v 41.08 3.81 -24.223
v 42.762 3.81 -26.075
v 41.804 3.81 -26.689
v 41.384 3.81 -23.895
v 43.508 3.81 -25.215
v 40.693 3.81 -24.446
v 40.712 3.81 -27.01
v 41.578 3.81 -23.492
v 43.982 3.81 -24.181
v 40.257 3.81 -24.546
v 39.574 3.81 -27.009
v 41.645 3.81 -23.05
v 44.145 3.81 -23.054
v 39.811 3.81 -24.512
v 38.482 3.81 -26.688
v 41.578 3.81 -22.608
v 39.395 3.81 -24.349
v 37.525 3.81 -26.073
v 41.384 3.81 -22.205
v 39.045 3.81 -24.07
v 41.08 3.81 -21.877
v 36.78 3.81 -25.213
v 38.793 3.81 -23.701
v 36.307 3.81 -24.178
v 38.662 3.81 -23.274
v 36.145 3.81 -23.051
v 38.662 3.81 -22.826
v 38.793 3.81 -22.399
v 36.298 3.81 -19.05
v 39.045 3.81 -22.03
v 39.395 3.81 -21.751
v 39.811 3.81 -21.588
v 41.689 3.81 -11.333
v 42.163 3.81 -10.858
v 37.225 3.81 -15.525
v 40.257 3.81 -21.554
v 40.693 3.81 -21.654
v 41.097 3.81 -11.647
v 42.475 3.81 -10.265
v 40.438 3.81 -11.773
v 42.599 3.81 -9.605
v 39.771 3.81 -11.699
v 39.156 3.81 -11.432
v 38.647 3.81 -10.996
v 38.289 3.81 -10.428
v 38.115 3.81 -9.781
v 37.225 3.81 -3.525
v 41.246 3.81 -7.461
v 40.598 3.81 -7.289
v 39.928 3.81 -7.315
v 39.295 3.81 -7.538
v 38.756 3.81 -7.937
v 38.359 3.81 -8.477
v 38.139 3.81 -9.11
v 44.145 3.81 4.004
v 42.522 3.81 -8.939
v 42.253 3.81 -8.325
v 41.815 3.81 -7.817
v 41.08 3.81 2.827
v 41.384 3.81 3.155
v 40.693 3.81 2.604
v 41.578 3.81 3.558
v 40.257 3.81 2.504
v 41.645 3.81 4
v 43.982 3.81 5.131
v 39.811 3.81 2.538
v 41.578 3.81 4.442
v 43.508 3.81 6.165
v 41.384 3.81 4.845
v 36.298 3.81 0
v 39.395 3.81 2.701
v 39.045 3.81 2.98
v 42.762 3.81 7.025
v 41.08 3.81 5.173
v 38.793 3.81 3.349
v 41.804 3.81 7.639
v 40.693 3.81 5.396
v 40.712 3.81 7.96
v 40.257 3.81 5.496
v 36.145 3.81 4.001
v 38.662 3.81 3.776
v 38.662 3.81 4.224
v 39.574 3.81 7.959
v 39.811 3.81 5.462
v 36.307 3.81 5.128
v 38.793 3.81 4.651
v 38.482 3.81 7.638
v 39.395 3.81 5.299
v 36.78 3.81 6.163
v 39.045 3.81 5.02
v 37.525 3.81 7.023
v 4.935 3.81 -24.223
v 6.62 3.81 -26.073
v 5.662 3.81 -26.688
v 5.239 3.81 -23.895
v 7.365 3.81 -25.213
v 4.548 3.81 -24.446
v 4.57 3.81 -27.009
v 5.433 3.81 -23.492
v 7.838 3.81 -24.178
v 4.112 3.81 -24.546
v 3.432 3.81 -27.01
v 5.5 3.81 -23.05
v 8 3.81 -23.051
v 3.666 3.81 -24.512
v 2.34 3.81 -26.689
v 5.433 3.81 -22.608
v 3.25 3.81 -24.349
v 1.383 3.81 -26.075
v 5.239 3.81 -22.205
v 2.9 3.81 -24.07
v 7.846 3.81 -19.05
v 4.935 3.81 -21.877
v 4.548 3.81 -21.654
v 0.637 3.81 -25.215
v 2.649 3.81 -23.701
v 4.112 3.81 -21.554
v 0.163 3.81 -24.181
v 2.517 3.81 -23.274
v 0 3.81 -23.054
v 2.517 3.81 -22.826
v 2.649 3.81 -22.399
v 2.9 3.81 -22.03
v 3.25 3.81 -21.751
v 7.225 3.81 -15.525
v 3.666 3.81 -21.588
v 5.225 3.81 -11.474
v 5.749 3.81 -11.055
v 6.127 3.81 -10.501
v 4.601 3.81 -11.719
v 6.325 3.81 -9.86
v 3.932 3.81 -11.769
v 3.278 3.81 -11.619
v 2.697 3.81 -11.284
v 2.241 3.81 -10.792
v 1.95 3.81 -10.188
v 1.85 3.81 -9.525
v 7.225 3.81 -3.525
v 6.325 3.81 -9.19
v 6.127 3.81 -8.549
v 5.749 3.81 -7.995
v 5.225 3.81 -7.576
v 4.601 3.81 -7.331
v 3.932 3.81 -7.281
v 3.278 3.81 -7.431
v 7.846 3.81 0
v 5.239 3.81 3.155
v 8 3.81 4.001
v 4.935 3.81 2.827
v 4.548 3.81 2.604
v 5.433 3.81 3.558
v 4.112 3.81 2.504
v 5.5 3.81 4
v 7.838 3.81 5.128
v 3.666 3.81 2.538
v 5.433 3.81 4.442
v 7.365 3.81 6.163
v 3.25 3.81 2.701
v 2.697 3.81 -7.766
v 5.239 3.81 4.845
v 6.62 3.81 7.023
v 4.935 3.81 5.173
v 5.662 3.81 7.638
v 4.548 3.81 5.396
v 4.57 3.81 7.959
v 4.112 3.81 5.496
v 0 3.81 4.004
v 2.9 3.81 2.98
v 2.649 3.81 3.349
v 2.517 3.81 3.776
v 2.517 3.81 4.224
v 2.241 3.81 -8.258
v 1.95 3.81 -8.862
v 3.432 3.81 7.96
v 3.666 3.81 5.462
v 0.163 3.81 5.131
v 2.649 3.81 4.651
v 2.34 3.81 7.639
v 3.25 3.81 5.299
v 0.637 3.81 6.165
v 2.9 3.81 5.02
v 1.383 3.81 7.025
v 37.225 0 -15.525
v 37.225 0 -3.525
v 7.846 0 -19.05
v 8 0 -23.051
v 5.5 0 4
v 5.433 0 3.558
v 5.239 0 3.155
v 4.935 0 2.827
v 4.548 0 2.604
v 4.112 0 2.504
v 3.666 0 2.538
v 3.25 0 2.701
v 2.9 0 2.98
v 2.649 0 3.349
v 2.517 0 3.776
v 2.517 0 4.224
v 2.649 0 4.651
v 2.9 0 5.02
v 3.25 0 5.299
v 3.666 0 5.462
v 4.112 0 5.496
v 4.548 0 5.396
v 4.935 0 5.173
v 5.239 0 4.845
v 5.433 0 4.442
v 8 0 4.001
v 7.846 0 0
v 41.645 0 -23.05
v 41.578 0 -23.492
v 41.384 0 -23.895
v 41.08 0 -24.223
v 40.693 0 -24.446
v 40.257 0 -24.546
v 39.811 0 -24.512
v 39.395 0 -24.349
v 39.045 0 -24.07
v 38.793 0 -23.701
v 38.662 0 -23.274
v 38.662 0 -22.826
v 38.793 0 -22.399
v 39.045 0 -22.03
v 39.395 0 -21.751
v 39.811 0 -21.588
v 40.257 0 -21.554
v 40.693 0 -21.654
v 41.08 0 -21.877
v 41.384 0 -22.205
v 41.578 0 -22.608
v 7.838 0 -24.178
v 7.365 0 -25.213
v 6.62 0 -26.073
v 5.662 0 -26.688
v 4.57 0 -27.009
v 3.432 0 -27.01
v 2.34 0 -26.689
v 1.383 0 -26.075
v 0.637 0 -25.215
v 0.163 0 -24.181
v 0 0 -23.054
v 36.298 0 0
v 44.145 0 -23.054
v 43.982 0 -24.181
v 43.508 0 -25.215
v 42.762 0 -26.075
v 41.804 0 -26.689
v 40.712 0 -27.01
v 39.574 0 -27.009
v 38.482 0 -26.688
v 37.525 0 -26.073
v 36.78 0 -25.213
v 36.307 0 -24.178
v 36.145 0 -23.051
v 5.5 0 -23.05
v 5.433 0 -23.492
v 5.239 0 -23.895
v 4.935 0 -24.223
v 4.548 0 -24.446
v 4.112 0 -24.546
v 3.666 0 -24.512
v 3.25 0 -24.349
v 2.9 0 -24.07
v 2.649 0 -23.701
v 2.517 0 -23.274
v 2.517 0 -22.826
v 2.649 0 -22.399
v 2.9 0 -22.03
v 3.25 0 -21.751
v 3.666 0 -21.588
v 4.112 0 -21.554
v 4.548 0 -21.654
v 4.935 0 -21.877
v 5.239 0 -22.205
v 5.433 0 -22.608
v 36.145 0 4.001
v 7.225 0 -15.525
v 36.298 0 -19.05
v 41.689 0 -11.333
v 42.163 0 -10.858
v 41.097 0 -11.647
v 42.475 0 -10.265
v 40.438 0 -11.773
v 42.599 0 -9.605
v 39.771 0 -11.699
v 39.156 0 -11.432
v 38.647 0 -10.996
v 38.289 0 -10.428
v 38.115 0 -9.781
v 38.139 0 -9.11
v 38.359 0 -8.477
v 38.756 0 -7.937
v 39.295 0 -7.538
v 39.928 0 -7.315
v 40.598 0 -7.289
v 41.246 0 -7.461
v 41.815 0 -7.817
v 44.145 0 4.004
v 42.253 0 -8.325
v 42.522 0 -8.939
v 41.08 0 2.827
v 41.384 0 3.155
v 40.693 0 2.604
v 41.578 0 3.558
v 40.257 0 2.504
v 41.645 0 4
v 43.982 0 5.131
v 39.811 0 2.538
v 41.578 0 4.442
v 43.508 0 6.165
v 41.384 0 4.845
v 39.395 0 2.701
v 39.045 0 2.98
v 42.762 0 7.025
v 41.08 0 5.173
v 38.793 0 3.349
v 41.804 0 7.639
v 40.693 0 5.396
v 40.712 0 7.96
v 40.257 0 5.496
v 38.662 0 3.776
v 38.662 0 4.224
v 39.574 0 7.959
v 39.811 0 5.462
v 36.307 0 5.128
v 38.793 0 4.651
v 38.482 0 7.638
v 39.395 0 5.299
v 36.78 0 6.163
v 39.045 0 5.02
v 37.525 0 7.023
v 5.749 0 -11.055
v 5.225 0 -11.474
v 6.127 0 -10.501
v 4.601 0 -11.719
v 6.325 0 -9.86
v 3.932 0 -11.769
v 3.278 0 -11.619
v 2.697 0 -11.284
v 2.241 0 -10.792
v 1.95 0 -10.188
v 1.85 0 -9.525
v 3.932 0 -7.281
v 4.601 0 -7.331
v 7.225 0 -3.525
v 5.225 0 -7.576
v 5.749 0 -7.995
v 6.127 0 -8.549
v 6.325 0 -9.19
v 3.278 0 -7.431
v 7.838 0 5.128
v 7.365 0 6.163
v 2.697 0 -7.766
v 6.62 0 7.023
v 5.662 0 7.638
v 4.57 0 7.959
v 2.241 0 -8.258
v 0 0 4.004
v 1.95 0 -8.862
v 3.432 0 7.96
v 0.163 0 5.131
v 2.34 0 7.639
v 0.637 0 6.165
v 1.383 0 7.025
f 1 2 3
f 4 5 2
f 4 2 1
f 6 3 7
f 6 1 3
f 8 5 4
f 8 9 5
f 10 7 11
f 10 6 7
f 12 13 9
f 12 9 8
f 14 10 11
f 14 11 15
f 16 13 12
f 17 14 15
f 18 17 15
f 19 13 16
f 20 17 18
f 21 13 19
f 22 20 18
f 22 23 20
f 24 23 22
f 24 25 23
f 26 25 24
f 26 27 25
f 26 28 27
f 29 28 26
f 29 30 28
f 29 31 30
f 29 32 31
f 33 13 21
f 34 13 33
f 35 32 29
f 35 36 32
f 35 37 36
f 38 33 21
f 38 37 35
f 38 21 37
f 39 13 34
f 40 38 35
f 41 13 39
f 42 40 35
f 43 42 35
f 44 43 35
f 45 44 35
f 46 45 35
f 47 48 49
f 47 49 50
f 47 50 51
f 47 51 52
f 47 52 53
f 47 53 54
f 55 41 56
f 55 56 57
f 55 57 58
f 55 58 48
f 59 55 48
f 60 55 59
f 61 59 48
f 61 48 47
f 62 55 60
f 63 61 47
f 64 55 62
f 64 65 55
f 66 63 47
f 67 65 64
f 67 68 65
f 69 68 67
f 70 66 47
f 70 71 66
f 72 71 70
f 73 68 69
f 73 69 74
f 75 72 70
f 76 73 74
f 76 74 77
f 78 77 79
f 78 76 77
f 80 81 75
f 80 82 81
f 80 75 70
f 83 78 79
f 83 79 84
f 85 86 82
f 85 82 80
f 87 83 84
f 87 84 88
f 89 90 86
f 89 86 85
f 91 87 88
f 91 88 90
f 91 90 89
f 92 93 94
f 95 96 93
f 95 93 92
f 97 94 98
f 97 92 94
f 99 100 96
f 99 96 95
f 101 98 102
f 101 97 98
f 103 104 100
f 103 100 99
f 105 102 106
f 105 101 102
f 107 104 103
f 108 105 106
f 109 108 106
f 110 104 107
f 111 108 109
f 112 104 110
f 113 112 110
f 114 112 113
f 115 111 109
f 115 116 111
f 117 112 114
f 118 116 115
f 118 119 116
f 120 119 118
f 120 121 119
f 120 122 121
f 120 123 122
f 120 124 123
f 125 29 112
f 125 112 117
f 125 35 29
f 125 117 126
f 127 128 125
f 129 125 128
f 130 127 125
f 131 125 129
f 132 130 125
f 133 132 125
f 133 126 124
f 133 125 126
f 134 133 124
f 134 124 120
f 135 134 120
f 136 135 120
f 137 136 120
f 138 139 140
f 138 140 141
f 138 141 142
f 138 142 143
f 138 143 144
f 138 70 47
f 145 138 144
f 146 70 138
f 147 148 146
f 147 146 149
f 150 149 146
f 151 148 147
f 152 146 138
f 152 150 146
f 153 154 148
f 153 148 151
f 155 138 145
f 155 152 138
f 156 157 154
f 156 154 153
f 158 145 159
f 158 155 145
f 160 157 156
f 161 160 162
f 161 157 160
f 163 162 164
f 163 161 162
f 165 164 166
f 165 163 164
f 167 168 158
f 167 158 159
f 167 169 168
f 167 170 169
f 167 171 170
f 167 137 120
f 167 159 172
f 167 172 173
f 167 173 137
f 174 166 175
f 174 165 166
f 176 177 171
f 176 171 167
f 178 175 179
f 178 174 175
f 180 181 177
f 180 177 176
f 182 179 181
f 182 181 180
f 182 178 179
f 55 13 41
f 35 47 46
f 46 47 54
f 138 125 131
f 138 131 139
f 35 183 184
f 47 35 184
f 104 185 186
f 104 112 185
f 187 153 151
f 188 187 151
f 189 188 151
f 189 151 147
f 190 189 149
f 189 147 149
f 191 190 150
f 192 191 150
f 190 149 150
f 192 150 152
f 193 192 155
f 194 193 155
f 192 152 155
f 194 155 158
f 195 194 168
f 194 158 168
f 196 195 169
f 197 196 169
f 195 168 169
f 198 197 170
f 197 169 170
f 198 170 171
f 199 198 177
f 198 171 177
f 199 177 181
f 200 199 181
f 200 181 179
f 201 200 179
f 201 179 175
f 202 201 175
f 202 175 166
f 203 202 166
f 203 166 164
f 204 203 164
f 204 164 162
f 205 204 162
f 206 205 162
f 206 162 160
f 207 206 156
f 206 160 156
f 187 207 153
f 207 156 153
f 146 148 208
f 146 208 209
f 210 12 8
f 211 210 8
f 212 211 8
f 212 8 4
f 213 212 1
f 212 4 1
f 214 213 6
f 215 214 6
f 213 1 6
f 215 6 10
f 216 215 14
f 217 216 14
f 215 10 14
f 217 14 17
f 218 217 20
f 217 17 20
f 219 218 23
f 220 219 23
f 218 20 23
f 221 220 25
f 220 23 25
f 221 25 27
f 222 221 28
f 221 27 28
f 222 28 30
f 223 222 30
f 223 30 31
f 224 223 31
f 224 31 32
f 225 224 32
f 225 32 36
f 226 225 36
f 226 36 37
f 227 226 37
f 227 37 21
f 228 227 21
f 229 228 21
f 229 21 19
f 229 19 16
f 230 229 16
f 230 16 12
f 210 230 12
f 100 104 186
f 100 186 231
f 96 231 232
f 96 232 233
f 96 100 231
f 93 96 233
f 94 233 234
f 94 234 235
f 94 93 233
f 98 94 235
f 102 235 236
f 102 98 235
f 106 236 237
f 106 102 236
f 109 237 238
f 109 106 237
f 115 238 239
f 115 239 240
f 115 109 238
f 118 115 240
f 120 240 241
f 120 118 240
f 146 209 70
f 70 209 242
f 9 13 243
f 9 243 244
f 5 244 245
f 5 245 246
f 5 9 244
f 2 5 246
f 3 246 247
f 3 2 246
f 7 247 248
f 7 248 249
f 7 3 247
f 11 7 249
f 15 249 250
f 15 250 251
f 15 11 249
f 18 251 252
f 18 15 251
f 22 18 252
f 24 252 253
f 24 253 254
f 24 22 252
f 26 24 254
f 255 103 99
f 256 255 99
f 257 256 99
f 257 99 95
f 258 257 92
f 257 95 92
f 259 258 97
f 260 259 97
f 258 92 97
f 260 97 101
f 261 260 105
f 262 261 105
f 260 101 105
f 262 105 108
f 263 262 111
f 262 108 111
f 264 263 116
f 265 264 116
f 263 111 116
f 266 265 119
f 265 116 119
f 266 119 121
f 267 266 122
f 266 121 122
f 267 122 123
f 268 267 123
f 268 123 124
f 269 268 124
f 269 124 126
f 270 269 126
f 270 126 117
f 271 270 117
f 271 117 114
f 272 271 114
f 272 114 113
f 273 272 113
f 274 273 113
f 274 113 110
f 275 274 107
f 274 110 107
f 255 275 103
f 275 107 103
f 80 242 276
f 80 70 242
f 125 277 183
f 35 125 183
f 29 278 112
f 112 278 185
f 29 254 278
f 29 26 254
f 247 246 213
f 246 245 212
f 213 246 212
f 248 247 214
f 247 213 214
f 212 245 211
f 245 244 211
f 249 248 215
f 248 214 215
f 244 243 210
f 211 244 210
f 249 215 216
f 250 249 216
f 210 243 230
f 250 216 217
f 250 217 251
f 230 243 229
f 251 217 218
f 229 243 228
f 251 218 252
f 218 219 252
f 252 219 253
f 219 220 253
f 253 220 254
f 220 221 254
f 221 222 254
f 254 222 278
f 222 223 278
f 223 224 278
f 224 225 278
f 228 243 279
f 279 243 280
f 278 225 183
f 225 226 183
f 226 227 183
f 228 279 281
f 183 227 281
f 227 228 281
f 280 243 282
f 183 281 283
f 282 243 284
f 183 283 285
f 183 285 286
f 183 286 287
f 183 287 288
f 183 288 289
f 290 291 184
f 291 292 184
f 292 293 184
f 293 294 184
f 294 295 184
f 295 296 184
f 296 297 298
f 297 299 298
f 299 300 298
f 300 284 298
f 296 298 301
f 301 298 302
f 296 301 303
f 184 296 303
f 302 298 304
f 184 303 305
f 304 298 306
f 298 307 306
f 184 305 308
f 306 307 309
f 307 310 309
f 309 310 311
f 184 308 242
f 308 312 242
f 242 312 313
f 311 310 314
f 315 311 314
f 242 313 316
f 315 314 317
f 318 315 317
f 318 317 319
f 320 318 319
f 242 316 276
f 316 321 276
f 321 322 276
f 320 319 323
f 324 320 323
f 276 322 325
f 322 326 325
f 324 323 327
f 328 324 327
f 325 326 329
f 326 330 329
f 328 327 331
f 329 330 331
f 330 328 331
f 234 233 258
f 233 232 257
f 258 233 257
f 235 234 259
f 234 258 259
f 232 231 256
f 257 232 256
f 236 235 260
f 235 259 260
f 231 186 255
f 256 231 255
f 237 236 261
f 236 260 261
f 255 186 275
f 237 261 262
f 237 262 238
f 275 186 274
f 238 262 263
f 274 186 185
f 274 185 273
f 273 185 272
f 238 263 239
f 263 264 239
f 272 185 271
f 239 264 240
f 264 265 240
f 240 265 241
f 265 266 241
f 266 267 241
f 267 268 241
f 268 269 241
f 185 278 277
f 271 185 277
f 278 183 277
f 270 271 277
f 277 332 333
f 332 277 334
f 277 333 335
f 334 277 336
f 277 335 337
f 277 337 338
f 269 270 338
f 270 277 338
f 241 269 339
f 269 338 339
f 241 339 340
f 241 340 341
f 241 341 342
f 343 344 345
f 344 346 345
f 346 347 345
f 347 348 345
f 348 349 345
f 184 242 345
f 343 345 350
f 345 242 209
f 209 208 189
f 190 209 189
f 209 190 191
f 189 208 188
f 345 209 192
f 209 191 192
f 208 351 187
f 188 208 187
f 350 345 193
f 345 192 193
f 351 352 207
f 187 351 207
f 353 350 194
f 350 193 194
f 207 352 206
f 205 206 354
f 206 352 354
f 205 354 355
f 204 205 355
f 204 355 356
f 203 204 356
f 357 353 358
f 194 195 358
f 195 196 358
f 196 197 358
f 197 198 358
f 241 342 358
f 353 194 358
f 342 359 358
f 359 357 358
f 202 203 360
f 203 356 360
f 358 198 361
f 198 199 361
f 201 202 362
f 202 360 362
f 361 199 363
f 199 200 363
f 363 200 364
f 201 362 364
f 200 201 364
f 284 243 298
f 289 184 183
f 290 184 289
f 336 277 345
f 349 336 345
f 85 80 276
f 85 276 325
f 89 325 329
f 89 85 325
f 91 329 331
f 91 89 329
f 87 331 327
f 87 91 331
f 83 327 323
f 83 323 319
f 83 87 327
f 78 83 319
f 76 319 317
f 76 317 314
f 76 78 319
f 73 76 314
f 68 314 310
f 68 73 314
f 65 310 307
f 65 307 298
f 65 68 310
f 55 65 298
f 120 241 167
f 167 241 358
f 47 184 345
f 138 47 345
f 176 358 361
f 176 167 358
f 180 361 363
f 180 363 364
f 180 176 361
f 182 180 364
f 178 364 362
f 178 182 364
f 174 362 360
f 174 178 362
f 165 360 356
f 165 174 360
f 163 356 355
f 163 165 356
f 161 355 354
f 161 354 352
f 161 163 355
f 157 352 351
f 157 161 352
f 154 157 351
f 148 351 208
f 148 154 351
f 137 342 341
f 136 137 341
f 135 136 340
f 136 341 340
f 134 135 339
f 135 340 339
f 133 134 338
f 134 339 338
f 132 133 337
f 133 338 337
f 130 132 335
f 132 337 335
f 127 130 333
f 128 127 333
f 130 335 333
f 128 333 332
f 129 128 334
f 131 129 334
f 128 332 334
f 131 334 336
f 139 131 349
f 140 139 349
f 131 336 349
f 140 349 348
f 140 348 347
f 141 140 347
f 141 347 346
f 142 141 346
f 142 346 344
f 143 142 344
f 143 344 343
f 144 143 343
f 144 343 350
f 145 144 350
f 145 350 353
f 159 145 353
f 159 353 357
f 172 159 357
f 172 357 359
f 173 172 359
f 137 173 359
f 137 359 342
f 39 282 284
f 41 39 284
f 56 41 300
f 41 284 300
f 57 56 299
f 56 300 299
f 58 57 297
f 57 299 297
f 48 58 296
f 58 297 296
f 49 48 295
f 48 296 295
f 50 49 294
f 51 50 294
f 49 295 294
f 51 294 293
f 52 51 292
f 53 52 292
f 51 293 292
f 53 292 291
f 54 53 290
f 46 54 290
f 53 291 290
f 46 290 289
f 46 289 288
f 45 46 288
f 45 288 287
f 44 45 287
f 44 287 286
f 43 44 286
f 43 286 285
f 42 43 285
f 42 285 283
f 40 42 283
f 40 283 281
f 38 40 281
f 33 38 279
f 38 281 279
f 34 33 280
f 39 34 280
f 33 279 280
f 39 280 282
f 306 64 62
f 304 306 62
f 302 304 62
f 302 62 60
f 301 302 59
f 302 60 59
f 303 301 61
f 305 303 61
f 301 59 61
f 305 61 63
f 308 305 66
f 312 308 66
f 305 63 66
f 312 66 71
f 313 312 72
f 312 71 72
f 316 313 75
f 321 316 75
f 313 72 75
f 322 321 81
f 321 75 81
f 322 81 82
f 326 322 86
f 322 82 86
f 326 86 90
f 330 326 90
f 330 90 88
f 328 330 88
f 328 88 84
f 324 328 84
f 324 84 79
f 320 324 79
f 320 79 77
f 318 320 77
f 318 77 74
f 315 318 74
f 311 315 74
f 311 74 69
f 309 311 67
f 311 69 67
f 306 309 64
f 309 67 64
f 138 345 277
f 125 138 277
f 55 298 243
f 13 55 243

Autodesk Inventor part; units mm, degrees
ref_plane "YZ Plane" through (0, 0, 0) normal (1, 0, 0) x (0, 1, 0)
ref_plane "XZ Plane" through (0, 0, 0) normal (0, 1, 0) x (-1, 0, 0)
ref_plane "XY Plane" through (0, 0, 0) normal (0, 0, 1) x (1, 0, 0)
sketch "Sketch3" plane through (0, 0, 0) normal (0, 1, 0) x (-1, 0, 0)
  line L0 (0.305195, 0) -> (-44.144805, 0)
  line L1 (-44.144805, 0) -> (-44.144805, -19.05)
  line L2 (-44.144805, -19.05) -> (0.305195, -19.05)
  line L3 (0.305195, -19.05) -> (0.305195, 0)
  arc A0 (-5.25, -6.73951) -> (-5.25, -5.26049) centre (-3.125, -6) ccw
  circle A1 centre (-3.125, -6) radius 2.25
  arc A2 (35.25, -5.26049) -> (35.25, -6.73951) centre (33.125, -6) ccw
  circle A3 centre (33.125, -6) radius 2.25
  line L4 (33.125, -6) -> (-3.125, -6)
  line L5 (0, -12) -> (0, 0)
  line L6 (30, -12) -> (0, -12)
  line L7 (0, -12) -> (0, 0)
  line L8 (0, 0) -> (30, 0)
  line L9 (30, 0) -> (30, -12)
  line L10 (30, -12) -> (0, 0) construction
  line L11 (0, -12) -> (30, 0) construction
  arc A4 (-42.475, -10.26451) -> (-42.475, -8.78549) centre (-40.35, -9.525) ccw
  circle A5 centre (-40.35, -9.525) radius 2.25
  arc A6 (-1.975, -8.78549) -> (-1.975, -10.26451) centre (-4.1, -9.525) ccw
  circle A7 centre (-4.1, -9.525) radius 2.25
  line L12 (-4.1, -9.525) -> (-40.35, -9.525)
  line L13 (-37.225, -15.525) -> (-37.225, -3.525)
  line L14 (-7.225, -15.525) -> (-37.225, -15.525)
  line L15 (-37.225, -15.525) -> (-37.225, -3.525)
  line L16 (-37.225, -3.525) -> (-7.225, -3.525)
  line L17 (-7.225, -3.525) -> (-7.225, -15.525)
  line L18 (-7.225, -15.525) -> (-37.225, -3.525) construction
  line L19 (-37.225, -15.525) -> (-7.225, -3.525) construction
  point P0 (15, -6)
  point P1 (-22.225, -9.525)
  point P2 (-4.875952, -7.413035)
  point P3 (-5.25, -6.73951)
  point P4 (-2.349048, -8.111965)
  point P5 (-1.975, -10.26451)
  point P6 (0.305195, -12)
  dimension "d12" = 4.5
  dimension "d13" = 4.5
  dimension "d17" = 4.5
  dimension "d18" = 4.5
  dimension "d9" = 44.45
  dimension "d10" = 19.05
  dimension "d11" = 36.25
  dimension "d14" = 30
  dimension "d15" = 12
  dimension "d16" = 36.25
  dimension "d19" = 30
  dimension "d20" = 12
extrude "Extrusion2" add sketch "Sketch3" along normal blind 3.81 contours L5 L6 L3 L2 L1 L0 | A0 A6 A1
sketch "Sketch4" plane through (0, 3.81, 0) normal (0, 1, 0) x (1, 0, 0)
  line L0 (0, 12) -> (0, 0)
  line L1 (-0.305195, 19.05) -> (-0.305195, 12)
  line L2 (0, 12) -> (-0.305195, 12)
  line L3 (-0.305195, 12) -> (-0.305195, 19.05)
  line L4 (-0.305195, 19.05) -> (0, 19.05)
  line L5 (0, 19.05) -> (0, 12)
extrude "Extrusion3" cut sketch "Sketch4" against normal blind 3.81
sketch "Sketch5" plane through (0, 3.81, 0) normal (0, 1, 0) x (1, 0, 0)
  line L0 (44.144805, 19.05) -> (0, 19.05)
  line L1 (22.072403, 19.05) -> (22.072403, 0)
  line L2 (0, 0) -> (44.144805, 0)
  line L3 (22.072403, 9.525) -> (0, 9.525)
  line L4 (0, 19.05) -> (0, 0)
  circle A0 centre (3.999998, -4) radius 4
  circle A1 centre (3.999998, -4) radius 1.5
  line L5 (0, 0) -> (44.144805, 0)
  line L6 (0, -4.004242) -> (0, 0)
  line L7 (0, 0) -> (7.846401, 0)
  line L8 (7.846401, 0) -> (7.999998, -4.001295)
  circle A2 centre (3.999998, 23.05) radius 4
  circle A3 centre (3.999998, 23.05) radius 1.5
  line L9 (0, 23.054242) -> (0, 19.05)
  line L10 (0, 19.05) -> (7.846401, 19.05)
  line L11 (7.846401, 19.05) -> (7.999998, 23.051295)
  line L12 (44.144805, 19.05) -> (44.144805, 0)
  circle A4 centre (40.144808, -4) radius 4
  circle A5 centre (40.144808, -4) radius 1.5
  line L13 (44.144805, -4.004242) -> (44.144805, 0)
  line L14 (44.144805, 0) -> (36.298405, 0)
  line L15 (36.298405, 0) -> (36.144808, -4.001295)
  circle A6 centre (40.144808, 23.05) radius 4
  circle A7 centre (40.144808, 23.05) radius 1.5
  line L16 (44.144805, 23.054242) -> (44.144805, 19.05)
  line L17 (44.144805, 19.05) -> (36.298405, 19.05)
  line L18 (36.298405, 19.05) -> (36.144808, 23.051295)
  point P0 (44.144805, 9.525)
  point P1 (7.846401, 0)
  dimension "d25" = 8
  dimension "d26" = 3
sketch "Sketch5 outline for Extrusion4" plane through (0, 3.81, 0) normal (0, 1, 0) x (1, 0, 0)
  line L0 (44.144805, -4.004242) -> (44.144805, 0)
  arc A0 (36.144808, -4.001295) -> (44.144805, -4.004242) centre (40.144808, -4) ccw
  line L1 (44.144805, 0) -> (36.298405, 0)
  line L2 (36.298405, 0) -> (36.144808, -4.001295)
  circle A1 centre (40.144808, -4) radius 1.5
  line L3 (36.298405, 19.05) -> (44.144805, 19.05)
  line L4 (36.144808, 23.051295) -> (36.298405, 19.05)
  line L5 (44.144805, 19.05) -> (44.144805, 23.054242)
  arc A2 (44.144805, 23.054242) -> (36.144808, 23.051295) centre (40.144808, 23.05) ccw
  circle A3 centre (40.144808, 23.05) radius 1.5
  line L6 (0, 0) -> (0, -4.004242)
  line L7 (7.846401, 0) -> (0, 0)
  arc A4 (0, -4.004242) -> (7.999998, -4.001295) centre (3.999998, -4) ccw
  line L8 (7.999998, -4.001295) -> (7.846401, 0)
  circle A5 centre (3.999998, -4) radius 1.5
  line L9 (7.846401, 19.05) -> (7.999998, 23.051295)
  line L10 (0, 19.05) -> (7.846401, 19.05)
  arc A6 (7.999998, 23.051295) -> (0, 23.054242) centre (3.999998, 23.05) ccw
  line L11 (0, 23.054242) -> (0, 19.05)
  circle A7 centre (3.999998, 23.05) radius 1.5
extrude "Extrusion4" add sketch "Sketch5 outline for Extrusion4" against normal blind 3.81
sketch "Sketch6" plane through (0, 3.81, 0) normal (0, 1, 0) x (1, 0, 0)
  line L0 (0, -7.9375) -> (44.144805, -7.9375)
  line L1 (44.144805, -7.9375) -> (44.144805, 26.9875)
  line L2 (44.144805, 26.9875) -> (0, 26.9875)
  line L3 (0, 26.9875) -> (0, -7.9375)
  circle A0 centre (3.999998, 23.05) radius 1.5
  circle A1 centre (3.999998, 23.05) radius 1.5
  circle A2 centre (3.999998, -4) radius 1.5
  circle A3 centre (3.999998, -4) radius 1.5
  circle A4 centre (40.144808, -4) radius 1.5
  circle A5 centre (40.144808, -4) radius 1.5
  circle A6 centre (40.144808, 23.05) radius 1.5
  circle A7 centre (40.144808, 23.05) radius 1.5
properties part number "motor mount v2"
